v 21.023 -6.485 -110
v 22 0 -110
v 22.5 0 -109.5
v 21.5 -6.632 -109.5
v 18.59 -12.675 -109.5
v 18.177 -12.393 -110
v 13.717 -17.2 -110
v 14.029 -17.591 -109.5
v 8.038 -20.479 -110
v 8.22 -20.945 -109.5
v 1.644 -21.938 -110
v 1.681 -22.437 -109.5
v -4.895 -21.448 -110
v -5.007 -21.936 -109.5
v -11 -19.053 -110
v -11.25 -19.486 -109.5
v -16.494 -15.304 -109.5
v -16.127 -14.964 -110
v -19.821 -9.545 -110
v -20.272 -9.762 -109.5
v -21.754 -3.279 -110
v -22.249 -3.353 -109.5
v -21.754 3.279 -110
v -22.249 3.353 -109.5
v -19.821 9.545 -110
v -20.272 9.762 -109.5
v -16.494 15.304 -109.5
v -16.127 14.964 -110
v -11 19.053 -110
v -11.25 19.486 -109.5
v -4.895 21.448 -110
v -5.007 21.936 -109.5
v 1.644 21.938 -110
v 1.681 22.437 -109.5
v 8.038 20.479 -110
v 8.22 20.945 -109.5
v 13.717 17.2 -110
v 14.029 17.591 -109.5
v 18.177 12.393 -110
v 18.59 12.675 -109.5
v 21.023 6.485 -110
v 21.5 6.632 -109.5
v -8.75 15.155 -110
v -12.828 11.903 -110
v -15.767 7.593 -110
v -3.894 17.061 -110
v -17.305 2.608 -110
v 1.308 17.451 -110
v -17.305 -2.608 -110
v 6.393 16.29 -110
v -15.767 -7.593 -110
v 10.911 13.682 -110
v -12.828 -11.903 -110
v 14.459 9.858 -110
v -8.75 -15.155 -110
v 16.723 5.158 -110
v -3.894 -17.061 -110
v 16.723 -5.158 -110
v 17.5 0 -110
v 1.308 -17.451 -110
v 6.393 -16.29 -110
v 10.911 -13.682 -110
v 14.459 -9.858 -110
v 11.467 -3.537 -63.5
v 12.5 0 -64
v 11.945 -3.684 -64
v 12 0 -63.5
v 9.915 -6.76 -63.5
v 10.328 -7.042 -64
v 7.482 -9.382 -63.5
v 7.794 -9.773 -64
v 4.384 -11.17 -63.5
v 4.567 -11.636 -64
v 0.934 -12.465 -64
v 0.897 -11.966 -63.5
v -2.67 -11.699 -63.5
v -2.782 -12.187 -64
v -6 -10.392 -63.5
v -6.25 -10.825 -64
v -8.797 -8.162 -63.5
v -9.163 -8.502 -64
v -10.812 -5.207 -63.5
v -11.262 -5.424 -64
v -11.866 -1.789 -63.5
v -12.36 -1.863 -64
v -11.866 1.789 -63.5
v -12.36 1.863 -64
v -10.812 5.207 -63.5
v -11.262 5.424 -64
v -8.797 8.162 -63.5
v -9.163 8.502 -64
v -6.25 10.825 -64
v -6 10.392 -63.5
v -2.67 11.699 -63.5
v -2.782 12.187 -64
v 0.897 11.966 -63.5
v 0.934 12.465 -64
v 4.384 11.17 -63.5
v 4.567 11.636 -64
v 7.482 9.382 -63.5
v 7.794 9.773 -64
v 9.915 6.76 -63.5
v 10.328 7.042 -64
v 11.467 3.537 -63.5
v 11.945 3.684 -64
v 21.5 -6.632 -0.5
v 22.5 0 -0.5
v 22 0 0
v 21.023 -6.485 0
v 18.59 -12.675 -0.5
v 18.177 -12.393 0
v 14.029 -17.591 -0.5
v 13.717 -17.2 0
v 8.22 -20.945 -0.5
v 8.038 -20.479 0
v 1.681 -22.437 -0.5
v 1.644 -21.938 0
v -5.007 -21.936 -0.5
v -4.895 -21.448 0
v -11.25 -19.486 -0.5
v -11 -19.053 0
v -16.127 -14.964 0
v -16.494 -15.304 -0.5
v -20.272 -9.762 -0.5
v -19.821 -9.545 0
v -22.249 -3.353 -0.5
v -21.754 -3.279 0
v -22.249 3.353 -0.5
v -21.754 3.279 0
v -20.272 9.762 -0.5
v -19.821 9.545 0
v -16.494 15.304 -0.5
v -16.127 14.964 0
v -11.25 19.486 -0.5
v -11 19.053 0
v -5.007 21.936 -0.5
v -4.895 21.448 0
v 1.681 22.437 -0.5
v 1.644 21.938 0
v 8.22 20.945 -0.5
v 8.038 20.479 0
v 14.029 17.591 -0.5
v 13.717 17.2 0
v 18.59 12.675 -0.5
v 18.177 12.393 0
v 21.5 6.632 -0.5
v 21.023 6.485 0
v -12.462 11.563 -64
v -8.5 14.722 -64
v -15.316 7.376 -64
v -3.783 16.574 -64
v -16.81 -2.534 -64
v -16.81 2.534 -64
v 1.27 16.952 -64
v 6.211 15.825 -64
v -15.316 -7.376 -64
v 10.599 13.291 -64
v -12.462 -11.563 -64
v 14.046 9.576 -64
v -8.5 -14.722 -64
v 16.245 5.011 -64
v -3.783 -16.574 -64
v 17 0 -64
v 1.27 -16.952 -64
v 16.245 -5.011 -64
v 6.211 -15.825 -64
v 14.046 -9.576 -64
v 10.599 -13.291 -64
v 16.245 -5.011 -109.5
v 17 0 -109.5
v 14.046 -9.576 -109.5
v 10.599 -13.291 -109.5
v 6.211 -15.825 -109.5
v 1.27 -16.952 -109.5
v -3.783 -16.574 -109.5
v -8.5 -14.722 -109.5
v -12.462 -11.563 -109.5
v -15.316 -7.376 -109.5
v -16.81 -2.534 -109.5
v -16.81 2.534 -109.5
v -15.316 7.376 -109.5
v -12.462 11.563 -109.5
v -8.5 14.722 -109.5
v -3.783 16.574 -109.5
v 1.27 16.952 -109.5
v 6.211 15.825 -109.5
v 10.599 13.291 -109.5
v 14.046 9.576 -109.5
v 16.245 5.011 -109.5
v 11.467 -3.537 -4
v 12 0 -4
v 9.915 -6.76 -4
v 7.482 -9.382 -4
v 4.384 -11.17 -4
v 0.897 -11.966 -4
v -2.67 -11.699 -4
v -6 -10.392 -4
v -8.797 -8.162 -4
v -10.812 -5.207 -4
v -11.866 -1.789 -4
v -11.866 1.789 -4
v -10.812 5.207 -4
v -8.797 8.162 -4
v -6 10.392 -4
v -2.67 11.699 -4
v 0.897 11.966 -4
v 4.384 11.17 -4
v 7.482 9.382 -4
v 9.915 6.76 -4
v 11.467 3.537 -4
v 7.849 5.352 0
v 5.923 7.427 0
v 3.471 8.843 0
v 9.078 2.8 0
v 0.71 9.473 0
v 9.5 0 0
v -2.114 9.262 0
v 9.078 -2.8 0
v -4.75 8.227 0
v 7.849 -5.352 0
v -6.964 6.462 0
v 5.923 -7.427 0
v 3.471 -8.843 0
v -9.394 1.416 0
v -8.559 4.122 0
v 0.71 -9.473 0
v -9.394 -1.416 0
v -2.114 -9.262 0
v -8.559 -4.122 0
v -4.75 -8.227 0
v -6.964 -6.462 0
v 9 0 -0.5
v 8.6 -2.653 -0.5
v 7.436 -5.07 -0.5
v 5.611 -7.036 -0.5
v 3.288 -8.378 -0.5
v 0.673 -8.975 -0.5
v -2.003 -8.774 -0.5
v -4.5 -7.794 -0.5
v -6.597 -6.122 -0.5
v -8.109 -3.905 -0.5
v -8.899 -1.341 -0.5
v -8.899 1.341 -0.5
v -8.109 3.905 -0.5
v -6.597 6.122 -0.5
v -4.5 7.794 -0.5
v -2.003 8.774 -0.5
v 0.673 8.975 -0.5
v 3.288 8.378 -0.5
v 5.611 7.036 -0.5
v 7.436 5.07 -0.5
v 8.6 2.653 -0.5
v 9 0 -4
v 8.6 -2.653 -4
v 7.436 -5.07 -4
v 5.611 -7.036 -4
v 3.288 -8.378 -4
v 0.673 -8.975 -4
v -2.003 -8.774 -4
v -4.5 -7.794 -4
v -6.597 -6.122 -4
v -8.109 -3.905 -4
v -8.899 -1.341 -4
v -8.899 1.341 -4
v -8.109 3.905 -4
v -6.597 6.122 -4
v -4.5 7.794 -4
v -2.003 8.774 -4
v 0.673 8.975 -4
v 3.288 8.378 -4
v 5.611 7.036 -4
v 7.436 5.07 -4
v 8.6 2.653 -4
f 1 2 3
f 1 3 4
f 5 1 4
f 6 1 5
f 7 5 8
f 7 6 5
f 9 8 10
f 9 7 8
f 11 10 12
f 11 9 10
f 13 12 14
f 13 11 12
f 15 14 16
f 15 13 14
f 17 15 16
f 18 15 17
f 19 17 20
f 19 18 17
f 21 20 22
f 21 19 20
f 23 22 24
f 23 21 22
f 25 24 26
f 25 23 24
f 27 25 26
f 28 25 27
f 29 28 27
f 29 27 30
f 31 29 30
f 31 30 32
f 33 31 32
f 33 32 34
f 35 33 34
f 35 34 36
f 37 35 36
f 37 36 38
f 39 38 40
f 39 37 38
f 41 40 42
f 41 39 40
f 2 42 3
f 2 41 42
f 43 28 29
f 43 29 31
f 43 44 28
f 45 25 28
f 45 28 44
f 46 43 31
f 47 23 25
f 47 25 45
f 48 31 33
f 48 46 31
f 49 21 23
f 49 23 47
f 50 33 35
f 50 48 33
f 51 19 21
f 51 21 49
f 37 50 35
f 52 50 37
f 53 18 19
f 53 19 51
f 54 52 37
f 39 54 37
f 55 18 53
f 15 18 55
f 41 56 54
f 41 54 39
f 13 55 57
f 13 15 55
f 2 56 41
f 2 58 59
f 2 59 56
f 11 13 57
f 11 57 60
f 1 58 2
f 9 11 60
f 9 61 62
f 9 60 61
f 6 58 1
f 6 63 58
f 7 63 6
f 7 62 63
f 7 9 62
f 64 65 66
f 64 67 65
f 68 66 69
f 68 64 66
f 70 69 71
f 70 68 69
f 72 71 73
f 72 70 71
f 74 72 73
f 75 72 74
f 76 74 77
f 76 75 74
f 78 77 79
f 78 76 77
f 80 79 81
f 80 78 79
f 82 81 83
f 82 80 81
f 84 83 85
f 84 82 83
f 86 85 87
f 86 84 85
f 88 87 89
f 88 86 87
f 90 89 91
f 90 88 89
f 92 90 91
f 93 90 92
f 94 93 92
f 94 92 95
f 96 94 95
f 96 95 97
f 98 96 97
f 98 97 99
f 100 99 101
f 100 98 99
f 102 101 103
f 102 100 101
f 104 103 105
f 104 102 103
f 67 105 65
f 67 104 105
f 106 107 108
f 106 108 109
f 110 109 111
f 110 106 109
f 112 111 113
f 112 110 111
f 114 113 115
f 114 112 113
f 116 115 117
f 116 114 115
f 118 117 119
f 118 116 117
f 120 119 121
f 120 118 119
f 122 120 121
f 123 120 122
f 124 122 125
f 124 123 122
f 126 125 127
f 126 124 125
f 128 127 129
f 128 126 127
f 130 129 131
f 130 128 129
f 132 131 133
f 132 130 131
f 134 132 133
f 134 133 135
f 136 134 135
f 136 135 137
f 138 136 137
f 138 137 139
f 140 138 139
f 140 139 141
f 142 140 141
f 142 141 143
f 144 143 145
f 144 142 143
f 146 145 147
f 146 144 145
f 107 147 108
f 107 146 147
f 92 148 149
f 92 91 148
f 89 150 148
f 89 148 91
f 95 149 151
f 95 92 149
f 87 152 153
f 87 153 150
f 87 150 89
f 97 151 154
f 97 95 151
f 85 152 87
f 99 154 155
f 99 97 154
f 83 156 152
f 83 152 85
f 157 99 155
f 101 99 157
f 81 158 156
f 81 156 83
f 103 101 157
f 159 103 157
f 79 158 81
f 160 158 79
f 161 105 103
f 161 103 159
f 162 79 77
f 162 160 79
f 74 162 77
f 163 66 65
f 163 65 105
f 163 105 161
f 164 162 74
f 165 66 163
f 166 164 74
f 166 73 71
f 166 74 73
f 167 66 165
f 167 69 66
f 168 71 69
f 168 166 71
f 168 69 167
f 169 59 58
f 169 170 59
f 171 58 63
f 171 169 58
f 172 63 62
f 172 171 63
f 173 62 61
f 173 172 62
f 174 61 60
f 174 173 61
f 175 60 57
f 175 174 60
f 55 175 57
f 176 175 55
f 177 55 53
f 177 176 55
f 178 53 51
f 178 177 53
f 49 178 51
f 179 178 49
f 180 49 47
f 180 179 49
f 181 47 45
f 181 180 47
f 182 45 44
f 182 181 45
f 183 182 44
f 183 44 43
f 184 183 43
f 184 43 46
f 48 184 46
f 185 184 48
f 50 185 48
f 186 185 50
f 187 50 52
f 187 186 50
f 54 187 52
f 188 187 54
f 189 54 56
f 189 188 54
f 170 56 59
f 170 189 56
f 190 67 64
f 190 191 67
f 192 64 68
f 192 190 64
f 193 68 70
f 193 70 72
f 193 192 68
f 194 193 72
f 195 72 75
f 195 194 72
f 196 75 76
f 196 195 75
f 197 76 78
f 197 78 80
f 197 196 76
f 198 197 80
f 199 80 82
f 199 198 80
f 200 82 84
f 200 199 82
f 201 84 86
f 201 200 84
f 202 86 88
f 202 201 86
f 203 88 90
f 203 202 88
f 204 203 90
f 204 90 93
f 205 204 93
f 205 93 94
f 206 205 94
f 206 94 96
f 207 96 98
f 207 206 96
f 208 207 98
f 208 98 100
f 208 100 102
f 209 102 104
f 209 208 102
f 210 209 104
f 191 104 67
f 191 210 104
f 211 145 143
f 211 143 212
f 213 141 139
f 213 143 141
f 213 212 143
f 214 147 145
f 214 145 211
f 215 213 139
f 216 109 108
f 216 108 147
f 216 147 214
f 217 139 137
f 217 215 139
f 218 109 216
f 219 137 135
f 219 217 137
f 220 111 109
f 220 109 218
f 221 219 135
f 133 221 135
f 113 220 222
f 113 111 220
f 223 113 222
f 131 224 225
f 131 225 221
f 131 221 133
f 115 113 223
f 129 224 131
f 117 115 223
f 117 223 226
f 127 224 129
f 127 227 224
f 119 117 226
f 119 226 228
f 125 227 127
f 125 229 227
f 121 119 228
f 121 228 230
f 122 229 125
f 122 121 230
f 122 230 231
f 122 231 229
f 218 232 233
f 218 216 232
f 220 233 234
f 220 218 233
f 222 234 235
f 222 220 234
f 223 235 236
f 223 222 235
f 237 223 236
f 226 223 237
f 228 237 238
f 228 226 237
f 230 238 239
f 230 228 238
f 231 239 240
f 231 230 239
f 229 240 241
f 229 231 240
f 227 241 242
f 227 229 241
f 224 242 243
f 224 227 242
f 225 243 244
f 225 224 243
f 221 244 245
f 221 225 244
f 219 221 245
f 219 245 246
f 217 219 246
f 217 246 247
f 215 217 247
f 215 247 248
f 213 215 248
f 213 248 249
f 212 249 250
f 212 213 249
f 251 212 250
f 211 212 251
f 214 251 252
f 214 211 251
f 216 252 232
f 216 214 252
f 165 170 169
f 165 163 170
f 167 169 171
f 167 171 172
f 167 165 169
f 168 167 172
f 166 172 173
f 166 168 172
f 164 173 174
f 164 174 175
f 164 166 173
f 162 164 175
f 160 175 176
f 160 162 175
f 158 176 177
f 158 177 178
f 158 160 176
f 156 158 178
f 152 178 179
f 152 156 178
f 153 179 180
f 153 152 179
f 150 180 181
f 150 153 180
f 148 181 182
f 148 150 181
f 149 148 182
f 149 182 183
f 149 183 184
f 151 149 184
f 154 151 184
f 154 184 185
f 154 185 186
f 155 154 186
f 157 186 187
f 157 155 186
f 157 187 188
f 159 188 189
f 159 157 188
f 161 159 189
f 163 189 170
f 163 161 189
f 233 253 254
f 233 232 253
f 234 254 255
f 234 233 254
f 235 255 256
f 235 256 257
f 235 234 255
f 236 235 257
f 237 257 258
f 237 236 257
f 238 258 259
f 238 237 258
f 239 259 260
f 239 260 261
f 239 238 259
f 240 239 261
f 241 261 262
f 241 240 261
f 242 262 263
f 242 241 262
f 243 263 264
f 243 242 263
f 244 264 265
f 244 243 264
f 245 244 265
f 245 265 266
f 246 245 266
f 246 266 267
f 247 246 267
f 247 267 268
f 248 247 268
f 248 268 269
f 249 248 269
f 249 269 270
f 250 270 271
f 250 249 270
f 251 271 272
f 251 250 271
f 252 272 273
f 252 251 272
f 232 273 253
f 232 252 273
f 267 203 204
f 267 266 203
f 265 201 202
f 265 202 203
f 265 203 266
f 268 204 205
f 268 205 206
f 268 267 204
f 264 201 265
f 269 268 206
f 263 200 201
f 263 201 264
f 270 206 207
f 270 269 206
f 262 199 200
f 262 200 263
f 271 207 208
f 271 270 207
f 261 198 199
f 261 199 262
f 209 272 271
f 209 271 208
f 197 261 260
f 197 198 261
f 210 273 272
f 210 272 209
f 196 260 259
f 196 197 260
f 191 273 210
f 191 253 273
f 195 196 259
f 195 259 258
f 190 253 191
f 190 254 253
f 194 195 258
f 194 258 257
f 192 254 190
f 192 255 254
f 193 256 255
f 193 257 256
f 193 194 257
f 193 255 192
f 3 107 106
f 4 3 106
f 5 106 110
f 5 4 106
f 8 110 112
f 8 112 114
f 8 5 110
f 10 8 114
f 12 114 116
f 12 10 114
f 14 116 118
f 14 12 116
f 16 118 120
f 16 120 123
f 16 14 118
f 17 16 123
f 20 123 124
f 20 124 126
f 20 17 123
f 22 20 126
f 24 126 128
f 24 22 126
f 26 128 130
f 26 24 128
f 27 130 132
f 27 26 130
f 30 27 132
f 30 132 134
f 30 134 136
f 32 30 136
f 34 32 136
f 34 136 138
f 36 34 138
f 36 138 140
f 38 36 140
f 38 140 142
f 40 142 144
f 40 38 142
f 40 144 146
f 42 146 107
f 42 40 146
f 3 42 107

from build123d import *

# Parameters (mm, degrees)
CHAMFER1_SIZE = 0.5


with BuildPart() as part:
    # Sketch1 → Revolve1 (revolve)
    with BuildSketch(Plane(origin=(0, 0, 0), x_dir=(0, 0, -1), z_dir=(1, 0, 0)), mode=Mode.PRIVATE) as revolve1_sk:
        Polygon((0, 9.5), (0, 22.5), (110, 22.5), (110, 17.5), (109.5, 17), (64, 17), (64, 12.5), (63.5, 12), (4, 12), (4, 9), (0.5, 9), align=None)
    revolve(revolve1_sk.sketch.rotate(Axis((0, 0, 0), (0, 0, -1)), 90), axis=Axis((0, 0, 0), (0, 0, -1)))

    # Chamfer1
    chamfer1_edges = [part.edges().sort_by_distance(p)[0] for p in [
        (-22.5, 0, -110),
        (-22.5, 0, 0),
    ]]
    chamfer(chamfer1_edges, length=CHAMFER1_SIZE)


solid = part.part
